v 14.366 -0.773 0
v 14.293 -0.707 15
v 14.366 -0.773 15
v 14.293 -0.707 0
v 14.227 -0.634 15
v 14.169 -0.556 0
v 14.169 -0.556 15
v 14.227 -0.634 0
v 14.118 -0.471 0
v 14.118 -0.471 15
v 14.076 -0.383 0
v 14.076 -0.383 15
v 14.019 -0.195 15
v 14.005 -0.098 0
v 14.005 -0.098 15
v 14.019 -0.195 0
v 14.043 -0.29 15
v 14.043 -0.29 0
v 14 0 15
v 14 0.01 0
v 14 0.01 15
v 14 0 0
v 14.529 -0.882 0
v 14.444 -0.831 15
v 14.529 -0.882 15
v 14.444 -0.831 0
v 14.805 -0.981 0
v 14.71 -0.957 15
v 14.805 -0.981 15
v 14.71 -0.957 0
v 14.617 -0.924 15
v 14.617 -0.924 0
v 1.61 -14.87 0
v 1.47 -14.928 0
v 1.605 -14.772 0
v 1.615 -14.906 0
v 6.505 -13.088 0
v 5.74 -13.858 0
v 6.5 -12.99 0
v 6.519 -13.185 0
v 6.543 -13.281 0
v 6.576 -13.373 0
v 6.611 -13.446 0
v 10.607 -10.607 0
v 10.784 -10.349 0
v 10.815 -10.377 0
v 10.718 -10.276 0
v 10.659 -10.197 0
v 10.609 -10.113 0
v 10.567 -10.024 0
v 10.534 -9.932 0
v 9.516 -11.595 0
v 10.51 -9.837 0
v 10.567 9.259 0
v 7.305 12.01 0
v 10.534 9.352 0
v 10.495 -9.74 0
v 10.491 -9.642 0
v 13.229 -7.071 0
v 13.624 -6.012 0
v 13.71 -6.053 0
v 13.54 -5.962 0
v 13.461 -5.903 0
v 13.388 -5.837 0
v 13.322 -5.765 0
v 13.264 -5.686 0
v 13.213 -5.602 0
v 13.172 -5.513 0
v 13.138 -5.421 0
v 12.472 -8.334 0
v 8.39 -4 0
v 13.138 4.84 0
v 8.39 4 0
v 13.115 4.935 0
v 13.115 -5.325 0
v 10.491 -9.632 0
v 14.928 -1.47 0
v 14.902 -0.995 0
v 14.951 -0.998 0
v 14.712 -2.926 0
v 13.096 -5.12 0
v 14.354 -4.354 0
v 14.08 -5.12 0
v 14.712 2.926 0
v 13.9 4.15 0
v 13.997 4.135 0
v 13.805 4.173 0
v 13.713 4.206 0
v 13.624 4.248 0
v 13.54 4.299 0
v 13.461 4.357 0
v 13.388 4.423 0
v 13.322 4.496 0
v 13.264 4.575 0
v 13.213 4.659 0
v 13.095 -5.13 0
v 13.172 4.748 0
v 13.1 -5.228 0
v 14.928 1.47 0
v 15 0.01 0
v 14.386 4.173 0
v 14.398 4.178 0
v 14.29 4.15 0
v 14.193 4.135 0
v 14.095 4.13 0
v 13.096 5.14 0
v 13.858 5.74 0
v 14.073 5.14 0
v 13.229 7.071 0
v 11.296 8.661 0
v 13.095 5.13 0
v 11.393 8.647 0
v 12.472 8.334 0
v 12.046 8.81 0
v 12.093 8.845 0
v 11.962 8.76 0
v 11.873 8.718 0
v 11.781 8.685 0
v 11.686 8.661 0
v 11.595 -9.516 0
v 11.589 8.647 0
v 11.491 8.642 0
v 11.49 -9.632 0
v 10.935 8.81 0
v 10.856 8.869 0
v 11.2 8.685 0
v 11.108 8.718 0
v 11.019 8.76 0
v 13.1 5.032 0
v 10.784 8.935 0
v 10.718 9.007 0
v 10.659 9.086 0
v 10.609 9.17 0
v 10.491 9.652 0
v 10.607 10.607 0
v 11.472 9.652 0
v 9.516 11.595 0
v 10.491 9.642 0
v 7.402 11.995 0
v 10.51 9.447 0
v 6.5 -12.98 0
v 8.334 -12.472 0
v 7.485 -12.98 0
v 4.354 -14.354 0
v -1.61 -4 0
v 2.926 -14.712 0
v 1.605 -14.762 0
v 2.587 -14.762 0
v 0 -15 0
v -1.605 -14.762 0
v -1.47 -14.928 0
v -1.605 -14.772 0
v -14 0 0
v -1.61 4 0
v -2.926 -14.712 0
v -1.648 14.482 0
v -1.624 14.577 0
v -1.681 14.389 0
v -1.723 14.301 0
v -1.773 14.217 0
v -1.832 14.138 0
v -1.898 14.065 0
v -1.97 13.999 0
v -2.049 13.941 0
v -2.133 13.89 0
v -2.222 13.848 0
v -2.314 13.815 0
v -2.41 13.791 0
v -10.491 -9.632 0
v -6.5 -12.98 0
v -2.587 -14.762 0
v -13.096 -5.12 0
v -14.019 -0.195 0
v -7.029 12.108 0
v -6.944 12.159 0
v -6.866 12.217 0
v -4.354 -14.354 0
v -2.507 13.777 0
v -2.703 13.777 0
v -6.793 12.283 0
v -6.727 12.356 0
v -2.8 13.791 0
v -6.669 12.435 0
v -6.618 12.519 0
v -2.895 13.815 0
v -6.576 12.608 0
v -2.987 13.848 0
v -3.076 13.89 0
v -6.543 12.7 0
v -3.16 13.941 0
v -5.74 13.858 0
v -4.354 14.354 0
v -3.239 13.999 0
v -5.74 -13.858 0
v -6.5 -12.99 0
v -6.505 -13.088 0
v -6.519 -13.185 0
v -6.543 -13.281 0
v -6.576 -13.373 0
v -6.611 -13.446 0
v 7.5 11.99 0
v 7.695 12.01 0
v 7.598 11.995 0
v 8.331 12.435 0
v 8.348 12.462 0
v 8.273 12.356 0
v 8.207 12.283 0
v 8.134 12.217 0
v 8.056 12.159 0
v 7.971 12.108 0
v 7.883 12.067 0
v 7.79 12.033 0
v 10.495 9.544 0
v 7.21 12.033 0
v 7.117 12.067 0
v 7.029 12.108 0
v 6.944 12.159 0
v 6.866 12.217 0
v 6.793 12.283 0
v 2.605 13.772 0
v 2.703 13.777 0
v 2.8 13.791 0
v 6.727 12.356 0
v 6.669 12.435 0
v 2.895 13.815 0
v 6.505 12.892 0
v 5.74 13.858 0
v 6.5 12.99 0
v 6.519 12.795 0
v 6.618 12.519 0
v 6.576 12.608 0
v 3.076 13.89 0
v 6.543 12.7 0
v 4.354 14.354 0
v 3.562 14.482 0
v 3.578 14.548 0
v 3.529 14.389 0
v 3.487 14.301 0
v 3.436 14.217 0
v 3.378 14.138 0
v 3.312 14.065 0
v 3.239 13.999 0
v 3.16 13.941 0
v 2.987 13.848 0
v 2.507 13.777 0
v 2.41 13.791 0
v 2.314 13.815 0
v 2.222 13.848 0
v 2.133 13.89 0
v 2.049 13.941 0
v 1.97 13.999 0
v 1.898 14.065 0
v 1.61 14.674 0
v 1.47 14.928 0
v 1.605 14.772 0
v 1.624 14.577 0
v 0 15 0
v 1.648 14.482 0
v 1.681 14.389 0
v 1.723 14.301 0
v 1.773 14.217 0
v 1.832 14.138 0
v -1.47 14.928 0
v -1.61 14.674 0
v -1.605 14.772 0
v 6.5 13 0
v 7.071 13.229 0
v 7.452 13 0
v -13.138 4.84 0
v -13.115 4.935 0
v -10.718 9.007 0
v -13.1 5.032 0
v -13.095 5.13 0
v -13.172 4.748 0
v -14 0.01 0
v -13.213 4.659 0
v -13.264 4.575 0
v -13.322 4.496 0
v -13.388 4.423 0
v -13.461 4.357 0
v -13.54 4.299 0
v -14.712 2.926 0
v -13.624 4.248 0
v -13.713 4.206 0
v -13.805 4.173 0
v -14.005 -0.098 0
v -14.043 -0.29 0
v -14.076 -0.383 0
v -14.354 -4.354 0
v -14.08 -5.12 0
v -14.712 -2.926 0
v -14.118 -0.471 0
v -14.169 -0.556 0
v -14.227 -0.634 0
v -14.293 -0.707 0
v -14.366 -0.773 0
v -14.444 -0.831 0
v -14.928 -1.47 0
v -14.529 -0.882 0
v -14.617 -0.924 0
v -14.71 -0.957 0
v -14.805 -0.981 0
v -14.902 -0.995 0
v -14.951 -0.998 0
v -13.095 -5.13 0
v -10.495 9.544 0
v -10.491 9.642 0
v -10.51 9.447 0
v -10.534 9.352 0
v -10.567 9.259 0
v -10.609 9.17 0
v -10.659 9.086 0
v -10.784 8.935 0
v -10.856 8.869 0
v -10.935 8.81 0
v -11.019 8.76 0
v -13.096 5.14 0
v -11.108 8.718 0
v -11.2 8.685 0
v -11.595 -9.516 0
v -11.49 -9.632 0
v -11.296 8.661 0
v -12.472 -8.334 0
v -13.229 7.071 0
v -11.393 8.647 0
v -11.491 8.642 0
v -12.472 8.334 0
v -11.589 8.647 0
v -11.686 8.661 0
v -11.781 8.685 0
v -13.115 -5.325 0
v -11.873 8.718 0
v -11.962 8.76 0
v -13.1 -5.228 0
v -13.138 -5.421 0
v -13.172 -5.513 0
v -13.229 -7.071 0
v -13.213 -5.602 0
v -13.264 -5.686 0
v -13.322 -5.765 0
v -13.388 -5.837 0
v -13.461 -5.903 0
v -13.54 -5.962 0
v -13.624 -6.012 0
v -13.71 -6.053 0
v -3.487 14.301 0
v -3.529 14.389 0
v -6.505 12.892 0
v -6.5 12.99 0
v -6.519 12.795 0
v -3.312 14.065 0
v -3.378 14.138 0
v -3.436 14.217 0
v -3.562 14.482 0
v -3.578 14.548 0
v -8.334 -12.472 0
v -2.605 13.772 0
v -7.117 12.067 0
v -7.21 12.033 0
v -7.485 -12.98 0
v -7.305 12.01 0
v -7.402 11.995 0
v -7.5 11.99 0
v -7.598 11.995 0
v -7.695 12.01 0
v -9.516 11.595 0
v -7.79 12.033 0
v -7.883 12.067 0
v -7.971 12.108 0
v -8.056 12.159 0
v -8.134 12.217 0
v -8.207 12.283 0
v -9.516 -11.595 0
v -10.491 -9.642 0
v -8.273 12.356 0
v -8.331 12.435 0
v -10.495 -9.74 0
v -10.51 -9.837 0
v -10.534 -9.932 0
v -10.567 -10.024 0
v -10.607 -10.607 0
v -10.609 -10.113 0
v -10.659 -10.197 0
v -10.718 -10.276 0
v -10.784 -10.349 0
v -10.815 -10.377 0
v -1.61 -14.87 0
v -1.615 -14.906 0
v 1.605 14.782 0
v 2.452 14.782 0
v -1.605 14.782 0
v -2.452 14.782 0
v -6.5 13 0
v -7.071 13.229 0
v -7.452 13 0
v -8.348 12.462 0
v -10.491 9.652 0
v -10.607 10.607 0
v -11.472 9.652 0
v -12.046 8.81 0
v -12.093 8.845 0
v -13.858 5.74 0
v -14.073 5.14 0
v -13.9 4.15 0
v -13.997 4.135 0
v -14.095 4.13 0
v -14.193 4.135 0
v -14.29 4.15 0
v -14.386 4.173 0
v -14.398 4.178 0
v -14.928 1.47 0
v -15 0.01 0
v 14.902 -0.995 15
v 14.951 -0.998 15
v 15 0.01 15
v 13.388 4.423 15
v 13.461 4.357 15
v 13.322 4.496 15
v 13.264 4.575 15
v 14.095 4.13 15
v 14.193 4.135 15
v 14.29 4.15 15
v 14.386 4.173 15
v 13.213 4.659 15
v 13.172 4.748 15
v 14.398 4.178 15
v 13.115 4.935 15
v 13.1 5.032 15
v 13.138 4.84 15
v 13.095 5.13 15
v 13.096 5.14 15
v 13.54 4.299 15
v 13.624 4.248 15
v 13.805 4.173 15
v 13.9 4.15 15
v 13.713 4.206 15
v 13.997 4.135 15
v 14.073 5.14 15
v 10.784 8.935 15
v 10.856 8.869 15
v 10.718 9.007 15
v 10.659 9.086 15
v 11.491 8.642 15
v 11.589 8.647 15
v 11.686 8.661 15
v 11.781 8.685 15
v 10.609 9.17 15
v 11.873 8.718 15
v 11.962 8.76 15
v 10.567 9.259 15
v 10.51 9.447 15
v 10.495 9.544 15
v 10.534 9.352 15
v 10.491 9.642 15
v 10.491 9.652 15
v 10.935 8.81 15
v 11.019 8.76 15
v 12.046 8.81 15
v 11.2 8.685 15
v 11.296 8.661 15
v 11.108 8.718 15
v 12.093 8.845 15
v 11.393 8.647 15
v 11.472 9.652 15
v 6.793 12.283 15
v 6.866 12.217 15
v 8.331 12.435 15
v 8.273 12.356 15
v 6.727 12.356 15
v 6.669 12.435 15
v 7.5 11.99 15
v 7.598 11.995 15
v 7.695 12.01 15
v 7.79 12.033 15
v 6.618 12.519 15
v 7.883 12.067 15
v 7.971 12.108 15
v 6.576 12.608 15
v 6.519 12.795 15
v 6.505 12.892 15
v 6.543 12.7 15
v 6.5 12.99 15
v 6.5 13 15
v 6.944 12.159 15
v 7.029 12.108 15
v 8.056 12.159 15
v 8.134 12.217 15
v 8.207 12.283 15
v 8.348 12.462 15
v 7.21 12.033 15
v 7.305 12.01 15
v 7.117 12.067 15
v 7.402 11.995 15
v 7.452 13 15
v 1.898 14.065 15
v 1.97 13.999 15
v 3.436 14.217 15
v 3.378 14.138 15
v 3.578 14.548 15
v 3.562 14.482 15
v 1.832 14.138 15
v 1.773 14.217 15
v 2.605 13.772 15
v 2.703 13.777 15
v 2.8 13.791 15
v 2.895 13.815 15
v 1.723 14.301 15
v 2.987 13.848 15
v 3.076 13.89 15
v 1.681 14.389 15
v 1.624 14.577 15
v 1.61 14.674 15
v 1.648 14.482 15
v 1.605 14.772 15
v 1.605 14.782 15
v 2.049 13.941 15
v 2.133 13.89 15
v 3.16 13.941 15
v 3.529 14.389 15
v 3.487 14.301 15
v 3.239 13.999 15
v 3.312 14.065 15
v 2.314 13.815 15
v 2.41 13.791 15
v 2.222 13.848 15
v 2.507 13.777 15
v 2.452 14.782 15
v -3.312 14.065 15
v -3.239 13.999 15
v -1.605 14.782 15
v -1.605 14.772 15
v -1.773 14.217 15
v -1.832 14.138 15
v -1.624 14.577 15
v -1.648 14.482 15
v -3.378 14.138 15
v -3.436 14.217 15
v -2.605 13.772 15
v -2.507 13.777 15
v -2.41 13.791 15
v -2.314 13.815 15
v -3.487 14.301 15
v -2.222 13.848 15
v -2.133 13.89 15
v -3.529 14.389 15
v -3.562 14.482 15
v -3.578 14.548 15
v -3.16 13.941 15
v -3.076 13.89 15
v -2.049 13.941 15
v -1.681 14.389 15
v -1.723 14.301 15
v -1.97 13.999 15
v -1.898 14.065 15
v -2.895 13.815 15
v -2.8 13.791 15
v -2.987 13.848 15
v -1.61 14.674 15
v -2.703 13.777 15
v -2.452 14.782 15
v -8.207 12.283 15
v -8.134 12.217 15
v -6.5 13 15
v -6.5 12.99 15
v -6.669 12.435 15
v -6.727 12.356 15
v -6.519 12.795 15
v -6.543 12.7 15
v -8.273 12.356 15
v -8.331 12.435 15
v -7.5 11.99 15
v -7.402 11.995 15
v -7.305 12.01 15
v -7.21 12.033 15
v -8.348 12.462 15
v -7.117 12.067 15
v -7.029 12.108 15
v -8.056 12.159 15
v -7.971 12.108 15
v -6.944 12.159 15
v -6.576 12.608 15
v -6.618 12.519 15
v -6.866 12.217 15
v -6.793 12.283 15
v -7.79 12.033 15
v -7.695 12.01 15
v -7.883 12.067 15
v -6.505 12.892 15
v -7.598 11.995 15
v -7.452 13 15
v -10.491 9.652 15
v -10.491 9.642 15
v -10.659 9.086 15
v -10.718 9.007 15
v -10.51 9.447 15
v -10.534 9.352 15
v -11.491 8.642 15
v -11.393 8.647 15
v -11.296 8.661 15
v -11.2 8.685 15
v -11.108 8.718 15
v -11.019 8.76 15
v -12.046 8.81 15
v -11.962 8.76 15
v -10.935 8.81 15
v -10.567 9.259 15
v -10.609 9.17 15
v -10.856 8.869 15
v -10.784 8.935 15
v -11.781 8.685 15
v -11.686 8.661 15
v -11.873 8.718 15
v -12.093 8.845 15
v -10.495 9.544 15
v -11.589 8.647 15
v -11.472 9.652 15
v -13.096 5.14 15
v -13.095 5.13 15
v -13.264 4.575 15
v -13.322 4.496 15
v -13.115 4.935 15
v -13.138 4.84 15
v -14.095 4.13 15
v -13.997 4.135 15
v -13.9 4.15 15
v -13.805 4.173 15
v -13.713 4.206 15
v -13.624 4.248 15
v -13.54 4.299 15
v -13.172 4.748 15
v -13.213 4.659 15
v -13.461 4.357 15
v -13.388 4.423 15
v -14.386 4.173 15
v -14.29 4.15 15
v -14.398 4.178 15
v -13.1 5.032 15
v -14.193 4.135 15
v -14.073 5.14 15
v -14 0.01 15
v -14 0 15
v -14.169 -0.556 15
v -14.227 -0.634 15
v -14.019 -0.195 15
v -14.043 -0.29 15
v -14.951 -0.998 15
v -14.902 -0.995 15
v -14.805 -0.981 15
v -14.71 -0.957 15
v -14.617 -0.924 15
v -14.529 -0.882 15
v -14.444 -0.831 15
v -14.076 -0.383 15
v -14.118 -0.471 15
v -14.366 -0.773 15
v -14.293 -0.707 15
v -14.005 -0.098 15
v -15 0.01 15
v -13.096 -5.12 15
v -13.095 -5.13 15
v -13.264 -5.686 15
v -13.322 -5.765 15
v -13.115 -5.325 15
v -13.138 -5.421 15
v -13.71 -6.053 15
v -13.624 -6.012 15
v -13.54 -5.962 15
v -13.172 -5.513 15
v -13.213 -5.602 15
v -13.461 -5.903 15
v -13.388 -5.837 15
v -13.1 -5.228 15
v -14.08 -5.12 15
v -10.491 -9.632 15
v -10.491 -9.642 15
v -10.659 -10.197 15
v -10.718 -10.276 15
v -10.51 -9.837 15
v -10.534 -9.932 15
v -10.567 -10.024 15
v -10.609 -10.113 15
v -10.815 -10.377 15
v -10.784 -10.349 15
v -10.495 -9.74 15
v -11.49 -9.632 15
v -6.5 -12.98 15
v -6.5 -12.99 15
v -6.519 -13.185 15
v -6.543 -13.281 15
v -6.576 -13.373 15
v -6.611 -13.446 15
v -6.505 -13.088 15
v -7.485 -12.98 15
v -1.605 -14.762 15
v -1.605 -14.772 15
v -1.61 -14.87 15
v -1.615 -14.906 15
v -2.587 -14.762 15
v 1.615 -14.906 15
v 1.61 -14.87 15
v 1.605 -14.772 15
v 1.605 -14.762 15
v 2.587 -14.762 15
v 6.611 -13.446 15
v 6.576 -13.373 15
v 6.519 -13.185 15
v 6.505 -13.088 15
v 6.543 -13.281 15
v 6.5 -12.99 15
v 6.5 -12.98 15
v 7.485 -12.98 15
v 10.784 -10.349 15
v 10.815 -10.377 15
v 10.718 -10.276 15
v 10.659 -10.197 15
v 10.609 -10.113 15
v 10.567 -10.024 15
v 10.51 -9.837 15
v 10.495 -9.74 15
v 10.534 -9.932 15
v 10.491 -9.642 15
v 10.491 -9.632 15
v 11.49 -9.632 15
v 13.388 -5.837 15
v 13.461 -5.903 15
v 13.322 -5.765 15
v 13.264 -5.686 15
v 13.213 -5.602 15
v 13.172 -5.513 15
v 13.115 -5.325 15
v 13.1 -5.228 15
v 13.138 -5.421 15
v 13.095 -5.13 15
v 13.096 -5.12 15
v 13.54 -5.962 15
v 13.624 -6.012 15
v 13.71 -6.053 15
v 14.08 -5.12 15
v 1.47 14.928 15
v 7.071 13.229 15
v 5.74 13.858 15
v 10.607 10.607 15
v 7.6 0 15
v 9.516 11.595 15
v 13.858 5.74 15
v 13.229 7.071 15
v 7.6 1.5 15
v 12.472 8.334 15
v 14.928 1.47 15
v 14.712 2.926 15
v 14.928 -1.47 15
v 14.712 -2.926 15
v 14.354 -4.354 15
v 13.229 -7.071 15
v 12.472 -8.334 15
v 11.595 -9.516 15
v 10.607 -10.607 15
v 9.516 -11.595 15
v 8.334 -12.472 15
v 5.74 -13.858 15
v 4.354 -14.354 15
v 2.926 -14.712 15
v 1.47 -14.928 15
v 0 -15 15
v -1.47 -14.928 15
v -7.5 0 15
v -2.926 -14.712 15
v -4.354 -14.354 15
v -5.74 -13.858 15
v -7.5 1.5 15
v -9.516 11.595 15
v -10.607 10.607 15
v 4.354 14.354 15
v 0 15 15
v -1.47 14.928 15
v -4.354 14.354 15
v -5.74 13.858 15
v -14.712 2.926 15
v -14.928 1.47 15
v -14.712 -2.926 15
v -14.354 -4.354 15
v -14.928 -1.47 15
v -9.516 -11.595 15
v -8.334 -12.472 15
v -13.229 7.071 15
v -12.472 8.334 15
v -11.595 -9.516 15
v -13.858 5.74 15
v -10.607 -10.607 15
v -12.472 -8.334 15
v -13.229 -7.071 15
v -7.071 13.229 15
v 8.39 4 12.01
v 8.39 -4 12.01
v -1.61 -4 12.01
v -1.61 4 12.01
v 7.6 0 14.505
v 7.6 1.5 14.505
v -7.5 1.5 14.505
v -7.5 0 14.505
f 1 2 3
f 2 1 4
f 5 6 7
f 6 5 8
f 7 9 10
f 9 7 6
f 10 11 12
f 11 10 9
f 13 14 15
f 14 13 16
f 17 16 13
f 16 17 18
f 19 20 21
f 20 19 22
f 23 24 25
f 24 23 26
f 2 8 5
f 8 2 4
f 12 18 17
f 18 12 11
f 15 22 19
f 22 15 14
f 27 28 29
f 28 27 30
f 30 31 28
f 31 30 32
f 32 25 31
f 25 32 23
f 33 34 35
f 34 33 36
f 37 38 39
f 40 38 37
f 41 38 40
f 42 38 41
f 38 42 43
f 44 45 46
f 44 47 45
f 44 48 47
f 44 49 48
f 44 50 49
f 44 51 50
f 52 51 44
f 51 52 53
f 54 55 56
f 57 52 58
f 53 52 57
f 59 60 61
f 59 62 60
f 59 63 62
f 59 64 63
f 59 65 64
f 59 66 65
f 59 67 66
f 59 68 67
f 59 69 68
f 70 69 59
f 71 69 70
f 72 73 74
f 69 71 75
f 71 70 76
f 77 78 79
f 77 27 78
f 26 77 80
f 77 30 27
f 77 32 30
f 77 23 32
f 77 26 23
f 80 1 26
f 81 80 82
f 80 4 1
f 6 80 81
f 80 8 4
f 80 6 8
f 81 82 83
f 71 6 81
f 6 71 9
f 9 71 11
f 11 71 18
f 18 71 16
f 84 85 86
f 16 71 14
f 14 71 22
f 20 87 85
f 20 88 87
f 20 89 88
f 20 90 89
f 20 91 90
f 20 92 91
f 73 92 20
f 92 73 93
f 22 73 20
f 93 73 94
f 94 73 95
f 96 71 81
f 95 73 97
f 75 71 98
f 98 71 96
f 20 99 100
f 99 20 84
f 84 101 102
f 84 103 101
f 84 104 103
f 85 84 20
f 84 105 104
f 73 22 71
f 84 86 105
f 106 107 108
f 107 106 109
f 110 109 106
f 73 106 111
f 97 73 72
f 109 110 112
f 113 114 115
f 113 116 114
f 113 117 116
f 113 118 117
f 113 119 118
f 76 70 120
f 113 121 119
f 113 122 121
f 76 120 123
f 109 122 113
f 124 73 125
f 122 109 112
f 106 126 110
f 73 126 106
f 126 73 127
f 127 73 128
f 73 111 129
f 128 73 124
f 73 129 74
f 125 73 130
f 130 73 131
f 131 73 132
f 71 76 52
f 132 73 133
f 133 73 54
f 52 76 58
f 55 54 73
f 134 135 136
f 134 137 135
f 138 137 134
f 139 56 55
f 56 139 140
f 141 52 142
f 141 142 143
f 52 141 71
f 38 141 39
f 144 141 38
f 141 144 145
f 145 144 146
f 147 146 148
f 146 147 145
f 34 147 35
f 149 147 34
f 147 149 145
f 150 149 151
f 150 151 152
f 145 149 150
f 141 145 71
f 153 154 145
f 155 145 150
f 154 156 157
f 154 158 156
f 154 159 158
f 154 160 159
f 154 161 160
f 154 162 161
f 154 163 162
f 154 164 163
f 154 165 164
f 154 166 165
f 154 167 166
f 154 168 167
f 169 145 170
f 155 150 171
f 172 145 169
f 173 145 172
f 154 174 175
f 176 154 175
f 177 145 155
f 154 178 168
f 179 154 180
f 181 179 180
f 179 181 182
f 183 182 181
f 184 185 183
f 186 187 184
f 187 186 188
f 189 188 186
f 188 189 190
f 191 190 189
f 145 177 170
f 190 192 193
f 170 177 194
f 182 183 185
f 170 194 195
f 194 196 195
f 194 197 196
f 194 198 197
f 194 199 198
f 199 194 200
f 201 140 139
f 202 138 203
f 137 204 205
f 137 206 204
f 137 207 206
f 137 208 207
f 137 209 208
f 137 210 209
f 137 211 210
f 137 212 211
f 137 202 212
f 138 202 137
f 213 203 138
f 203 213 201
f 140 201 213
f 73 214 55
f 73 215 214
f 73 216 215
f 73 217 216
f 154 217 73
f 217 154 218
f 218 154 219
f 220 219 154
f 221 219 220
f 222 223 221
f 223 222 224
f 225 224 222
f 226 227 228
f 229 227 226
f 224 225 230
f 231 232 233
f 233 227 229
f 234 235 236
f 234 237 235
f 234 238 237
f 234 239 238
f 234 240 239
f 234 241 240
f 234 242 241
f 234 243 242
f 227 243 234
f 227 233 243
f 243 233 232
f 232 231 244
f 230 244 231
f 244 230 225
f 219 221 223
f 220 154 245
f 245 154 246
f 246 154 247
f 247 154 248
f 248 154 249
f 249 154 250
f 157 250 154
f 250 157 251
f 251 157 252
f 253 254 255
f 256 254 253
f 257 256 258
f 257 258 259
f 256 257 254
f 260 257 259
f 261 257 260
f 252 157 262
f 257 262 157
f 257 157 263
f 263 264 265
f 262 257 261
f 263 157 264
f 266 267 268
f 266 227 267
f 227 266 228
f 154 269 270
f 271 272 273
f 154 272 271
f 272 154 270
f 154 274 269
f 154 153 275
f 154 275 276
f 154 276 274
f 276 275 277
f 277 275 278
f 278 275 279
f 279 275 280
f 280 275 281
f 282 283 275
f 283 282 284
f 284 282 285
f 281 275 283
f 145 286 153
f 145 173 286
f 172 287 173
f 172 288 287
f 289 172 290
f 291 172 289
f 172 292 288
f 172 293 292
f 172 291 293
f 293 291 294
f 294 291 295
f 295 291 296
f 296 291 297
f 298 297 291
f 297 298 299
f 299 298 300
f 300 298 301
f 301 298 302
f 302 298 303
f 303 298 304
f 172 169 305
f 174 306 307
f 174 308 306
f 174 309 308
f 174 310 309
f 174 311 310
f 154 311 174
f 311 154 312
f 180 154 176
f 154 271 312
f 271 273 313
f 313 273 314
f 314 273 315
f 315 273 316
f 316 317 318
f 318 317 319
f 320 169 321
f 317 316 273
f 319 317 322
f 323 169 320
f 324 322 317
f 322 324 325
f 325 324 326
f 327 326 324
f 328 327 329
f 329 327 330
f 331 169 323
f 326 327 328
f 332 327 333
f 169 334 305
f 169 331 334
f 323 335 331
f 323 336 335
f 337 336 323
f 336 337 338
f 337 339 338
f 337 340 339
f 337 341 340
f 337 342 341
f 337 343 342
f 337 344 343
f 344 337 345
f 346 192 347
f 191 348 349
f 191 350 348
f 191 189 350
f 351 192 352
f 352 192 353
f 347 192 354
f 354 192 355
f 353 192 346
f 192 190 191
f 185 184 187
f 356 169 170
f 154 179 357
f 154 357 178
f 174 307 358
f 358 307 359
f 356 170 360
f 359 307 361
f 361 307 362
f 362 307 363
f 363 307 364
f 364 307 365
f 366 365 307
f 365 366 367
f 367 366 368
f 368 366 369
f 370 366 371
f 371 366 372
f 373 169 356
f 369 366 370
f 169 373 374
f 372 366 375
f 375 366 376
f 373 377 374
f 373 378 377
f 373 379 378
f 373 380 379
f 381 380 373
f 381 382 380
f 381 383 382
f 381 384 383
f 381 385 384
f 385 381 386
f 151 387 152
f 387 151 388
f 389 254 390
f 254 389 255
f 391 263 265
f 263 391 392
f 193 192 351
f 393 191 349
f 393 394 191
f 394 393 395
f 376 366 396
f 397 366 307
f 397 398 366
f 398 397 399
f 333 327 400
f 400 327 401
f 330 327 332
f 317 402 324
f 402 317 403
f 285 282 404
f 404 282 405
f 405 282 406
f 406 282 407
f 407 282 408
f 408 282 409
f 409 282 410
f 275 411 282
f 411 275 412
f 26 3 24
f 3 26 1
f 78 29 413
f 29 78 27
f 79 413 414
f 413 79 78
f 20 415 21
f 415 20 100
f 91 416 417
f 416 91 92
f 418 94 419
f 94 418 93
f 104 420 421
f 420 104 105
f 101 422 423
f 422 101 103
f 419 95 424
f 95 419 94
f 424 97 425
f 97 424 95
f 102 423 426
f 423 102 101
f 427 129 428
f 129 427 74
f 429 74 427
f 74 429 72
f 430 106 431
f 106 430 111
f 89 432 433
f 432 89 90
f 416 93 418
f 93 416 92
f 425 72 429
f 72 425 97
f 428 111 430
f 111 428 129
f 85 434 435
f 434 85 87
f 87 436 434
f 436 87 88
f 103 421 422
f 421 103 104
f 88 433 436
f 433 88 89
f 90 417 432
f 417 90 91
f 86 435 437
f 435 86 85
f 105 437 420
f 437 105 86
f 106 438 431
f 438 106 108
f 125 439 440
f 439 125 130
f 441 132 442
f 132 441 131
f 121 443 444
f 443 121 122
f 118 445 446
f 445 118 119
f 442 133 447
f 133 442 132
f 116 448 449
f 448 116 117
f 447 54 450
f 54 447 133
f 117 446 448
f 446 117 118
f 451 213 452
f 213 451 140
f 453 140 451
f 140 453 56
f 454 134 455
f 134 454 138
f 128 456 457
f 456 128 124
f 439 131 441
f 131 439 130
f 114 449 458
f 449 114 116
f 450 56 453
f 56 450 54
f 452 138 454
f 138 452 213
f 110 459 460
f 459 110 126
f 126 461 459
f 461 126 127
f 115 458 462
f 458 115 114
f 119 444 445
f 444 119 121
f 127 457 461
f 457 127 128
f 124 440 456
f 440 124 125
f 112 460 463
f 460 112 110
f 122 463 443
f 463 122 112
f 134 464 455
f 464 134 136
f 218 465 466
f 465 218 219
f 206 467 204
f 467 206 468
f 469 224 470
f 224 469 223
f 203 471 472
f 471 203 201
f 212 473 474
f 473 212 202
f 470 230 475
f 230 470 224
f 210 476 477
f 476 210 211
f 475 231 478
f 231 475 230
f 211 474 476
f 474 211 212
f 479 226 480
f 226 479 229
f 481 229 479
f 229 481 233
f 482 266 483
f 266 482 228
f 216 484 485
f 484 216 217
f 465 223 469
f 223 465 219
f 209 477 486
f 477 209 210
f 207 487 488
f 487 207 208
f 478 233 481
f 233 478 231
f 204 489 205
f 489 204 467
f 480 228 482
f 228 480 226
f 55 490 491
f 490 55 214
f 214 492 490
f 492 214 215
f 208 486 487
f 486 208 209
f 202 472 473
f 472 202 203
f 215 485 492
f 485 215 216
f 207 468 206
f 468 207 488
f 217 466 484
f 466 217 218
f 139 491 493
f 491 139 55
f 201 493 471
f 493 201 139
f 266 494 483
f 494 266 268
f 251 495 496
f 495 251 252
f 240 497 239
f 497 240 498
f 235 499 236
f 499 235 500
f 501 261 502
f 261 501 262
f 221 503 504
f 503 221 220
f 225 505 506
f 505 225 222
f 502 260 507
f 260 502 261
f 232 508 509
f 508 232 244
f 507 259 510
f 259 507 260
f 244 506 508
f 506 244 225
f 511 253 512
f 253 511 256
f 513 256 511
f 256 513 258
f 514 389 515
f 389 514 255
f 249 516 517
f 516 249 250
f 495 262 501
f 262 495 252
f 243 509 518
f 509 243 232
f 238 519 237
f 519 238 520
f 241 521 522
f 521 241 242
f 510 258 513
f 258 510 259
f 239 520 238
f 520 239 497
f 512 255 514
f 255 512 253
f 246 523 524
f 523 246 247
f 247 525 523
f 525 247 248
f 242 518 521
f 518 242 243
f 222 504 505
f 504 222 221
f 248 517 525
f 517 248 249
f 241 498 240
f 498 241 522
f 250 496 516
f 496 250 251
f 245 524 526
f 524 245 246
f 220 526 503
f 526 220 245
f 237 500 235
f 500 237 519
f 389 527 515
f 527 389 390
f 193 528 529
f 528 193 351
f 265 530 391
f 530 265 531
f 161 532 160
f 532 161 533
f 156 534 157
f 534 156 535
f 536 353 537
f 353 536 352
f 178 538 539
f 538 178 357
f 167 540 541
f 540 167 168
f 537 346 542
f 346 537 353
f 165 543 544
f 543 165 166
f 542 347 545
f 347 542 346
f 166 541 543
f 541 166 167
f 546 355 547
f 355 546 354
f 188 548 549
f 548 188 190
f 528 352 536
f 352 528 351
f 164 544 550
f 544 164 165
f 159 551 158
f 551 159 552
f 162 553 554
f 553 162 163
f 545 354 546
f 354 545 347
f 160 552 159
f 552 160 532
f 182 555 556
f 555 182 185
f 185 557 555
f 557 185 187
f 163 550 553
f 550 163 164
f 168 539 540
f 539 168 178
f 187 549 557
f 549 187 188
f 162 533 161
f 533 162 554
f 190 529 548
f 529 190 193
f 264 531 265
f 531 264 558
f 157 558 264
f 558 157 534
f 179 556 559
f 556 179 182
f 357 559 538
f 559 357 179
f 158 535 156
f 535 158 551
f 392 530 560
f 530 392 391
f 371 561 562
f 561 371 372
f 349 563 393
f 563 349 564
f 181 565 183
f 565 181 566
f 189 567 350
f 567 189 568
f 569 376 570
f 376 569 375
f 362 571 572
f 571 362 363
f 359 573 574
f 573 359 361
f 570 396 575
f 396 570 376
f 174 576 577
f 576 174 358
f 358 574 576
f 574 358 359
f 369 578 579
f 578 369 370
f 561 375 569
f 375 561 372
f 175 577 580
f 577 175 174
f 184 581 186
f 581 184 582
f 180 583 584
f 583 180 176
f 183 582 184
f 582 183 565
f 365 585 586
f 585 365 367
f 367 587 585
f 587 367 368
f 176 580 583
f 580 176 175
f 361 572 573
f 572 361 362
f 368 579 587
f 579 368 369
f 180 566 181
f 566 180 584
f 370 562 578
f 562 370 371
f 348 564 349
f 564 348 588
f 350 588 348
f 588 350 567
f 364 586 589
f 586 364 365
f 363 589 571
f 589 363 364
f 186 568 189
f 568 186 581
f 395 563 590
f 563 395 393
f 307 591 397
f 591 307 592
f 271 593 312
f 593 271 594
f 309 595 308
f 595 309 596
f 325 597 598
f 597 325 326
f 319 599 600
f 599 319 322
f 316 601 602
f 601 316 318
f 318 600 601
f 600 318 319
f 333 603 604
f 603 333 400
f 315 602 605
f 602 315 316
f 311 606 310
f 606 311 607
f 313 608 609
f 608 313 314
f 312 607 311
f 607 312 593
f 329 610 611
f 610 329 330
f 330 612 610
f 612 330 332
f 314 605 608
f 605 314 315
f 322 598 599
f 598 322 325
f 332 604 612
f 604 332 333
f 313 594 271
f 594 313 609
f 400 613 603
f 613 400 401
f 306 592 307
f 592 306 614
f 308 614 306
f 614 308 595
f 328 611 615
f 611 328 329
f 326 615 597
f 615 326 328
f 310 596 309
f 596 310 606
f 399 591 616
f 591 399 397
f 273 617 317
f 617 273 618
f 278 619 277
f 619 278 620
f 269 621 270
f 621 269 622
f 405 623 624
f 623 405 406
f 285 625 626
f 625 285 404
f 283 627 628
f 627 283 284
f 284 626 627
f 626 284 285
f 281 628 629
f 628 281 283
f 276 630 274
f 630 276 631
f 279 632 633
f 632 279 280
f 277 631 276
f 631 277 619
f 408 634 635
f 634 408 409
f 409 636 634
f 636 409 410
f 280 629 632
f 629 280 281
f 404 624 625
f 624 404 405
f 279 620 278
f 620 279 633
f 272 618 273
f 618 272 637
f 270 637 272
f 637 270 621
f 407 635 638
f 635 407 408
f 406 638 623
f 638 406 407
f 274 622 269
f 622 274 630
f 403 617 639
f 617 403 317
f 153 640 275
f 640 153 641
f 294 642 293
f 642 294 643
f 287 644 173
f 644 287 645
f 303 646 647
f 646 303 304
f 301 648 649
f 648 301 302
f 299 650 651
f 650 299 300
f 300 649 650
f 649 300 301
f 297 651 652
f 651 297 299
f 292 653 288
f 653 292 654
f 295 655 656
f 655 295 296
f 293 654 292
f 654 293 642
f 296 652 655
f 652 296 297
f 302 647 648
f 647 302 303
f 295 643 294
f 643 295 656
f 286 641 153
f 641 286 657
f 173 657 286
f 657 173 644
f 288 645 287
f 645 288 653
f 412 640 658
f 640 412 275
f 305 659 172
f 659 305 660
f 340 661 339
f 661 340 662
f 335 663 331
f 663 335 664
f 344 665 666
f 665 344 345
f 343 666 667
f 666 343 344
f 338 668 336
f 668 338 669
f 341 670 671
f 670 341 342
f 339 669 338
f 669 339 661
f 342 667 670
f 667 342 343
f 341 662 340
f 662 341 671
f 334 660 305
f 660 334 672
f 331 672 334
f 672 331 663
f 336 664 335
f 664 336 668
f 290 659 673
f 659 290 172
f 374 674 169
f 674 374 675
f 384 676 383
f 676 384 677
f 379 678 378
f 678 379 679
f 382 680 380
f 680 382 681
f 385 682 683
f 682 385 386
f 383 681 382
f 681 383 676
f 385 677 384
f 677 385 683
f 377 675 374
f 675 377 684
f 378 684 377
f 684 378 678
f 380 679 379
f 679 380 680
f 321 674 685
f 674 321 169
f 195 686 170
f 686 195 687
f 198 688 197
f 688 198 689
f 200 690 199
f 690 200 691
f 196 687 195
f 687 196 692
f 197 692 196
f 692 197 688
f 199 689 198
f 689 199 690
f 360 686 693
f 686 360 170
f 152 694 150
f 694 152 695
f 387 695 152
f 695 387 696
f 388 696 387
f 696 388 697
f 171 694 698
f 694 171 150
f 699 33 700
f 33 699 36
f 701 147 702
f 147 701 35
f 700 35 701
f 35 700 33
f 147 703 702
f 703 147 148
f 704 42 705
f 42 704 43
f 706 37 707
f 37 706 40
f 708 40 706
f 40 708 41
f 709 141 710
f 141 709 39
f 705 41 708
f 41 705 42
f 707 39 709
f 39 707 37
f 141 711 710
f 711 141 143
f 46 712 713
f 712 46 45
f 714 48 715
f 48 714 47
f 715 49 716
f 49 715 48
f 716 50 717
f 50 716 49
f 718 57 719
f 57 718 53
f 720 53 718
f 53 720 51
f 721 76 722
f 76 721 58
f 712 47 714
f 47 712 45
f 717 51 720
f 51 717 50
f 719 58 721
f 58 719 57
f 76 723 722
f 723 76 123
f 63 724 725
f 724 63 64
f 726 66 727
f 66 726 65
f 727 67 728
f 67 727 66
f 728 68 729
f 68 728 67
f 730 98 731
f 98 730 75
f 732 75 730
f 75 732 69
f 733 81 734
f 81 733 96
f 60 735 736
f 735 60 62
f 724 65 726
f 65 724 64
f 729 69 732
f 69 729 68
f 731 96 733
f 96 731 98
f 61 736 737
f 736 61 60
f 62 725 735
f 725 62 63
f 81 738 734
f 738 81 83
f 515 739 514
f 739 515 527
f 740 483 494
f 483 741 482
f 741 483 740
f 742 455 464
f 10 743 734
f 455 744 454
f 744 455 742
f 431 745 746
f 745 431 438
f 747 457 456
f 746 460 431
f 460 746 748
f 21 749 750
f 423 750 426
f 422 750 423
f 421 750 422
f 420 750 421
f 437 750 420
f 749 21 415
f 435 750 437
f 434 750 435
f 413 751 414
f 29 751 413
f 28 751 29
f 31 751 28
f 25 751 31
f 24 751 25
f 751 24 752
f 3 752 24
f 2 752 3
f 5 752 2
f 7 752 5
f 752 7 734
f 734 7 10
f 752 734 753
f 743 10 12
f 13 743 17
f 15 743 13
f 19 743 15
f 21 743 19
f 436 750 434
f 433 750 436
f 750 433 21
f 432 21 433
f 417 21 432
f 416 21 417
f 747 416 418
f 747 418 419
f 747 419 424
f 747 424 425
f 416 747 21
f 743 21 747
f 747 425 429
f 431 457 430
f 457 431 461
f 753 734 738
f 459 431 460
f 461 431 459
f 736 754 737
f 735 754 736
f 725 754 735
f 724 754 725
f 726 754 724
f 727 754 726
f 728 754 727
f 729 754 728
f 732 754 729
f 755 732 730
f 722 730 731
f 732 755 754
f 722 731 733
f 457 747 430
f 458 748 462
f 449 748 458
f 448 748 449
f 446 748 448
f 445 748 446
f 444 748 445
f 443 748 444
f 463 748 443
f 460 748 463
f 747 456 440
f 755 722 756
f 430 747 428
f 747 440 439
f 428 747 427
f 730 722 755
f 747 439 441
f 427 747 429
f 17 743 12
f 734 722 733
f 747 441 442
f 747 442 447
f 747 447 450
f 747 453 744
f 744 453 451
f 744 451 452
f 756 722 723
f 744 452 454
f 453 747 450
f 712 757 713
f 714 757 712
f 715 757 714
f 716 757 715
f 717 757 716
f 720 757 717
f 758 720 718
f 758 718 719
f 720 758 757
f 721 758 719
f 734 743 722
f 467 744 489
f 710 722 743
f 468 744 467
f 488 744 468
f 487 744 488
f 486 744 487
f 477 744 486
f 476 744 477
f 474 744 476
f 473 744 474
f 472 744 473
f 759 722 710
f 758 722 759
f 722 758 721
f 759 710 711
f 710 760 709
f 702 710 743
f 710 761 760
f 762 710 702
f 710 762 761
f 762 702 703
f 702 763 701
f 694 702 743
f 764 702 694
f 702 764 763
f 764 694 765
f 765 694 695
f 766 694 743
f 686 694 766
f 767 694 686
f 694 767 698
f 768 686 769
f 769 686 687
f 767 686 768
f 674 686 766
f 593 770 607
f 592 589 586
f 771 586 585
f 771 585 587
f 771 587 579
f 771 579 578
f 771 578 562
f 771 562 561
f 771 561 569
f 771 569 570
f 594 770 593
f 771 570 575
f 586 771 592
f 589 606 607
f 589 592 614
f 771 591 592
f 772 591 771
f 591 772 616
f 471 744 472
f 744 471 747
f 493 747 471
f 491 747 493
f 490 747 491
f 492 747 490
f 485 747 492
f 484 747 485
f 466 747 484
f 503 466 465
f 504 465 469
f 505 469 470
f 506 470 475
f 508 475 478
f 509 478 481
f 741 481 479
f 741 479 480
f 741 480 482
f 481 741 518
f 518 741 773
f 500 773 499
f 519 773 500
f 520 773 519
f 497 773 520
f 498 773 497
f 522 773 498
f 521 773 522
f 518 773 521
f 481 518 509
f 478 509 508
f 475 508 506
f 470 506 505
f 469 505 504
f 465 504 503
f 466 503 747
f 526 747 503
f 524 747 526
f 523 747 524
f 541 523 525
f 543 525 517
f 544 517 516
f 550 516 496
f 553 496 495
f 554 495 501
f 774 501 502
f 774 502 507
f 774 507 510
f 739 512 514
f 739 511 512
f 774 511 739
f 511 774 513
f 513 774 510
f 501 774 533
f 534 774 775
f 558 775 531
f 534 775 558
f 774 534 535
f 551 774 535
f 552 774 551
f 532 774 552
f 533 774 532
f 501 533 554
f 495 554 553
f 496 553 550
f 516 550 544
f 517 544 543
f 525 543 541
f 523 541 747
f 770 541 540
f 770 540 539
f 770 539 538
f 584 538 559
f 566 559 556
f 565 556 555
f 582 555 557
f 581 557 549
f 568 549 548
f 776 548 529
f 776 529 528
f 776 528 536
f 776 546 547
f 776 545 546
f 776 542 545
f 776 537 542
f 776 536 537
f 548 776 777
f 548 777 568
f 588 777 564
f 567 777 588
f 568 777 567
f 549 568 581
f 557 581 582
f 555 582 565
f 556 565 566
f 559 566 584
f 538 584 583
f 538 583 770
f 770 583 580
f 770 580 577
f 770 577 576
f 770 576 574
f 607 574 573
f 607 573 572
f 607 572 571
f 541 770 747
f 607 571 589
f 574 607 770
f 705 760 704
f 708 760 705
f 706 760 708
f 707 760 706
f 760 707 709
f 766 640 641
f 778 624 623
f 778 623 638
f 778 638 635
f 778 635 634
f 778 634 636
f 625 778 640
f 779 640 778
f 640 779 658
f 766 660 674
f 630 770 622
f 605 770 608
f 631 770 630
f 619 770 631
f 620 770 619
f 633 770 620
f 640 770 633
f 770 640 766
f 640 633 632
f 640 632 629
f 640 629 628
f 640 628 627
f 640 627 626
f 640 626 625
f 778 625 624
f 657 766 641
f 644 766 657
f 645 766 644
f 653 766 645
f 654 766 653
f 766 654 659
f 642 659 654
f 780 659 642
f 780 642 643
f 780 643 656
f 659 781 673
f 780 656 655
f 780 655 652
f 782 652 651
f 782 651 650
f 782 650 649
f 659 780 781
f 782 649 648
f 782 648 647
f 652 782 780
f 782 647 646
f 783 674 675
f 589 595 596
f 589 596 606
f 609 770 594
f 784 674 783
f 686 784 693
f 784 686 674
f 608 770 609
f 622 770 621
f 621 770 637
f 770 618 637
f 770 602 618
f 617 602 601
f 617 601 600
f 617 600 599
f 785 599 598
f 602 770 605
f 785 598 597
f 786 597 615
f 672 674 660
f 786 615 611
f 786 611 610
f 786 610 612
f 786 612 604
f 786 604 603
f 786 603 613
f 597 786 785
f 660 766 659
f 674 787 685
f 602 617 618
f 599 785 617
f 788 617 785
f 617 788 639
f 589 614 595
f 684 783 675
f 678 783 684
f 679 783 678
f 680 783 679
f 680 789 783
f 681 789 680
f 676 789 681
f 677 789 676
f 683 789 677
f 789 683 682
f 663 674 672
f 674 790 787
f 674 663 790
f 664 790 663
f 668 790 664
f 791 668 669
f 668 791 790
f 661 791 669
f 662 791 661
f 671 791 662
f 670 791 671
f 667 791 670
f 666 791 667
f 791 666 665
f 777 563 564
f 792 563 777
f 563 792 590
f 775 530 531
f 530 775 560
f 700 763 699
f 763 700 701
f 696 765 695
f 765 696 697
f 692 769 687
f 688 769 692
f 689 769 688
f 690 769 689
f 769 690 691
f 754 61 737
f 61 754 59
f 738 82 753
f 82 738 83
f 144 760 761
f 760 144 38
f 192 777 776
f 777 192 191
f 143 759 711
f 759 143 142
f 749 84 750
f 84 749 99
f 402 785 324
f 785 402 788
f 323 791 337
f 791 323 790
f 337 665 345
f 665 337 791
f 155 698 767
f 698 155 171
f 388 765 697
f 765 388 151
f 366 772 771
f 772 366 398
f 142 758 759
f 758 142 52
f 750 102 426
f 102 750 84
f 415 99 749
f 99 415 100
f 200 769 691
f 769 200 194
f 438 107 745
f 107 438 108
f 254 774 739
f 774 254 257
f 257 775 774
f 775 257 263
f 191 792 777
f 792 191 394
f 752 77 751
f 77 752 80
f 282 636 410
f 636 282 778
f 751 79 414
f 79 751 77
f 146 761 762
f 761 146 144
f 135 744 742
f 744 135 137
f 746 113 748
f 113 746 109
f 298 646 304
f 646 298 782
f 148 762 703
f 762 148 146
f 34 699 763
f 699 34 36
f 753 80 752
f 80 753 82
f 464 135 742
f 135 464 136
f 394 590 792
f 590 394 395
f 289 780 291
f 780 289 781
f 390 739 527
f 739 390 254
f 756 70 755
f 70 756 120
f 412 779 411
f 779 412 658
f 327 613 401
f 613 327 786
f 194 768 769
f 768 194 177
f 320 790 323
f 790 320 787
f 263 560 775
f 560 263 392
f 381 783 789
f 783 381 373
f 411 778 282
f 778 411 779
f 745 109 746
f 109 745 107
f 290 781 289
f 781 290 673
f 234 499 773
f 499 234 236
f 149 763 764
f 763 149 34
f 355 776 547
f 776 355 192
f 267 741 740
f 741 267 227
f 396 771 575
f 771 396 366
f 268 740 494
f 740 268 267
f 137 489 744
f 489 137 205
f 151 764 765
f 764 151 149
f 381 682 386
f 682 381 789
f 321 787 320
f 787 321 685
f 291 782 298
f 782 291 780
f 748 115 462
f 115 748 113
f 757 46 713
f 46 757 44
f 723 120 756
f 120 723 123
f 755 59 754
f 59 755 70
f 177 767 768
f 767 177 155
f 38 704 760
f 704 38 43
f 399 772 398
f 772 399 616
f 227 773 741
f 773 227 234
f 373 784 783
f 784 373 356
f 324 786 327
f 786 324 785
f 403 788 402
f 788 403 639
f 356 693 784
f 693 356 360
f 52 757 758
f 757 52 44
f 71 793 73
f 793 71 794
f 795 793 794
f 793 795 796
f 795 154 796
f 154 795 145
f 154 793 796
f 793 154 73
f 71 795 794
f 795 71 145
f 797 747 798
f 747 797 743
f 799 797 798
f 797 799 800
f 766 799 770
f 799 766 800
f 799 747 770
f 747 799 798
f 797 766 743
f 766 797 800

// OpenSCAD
$fn = 64;

// --- Dimensions ---
R_KNOB      = 15;       // Knob radius (30 mm diameter)
H_KNOB      = 15;       // Knob height
R_BORE      = 3.1;      // Bore radius (6.2 mm diameter)
H_BORE      = 12;       // Bore depth
X_FLAT      = -1.6;     // X position of D-shaft flat (3.1 - 4.7)
NUM_GROOVES = 18;       // Number of grip grooves
R_GROOVE    = 1;        // Groove radius (2 mm diameter)
W_POINTER   = 1.5;      // Pointer groove width
D_POINTER    = 1;        // Pointer groove depth

// --- Main Model ---
difference() {
    // Solid cylinder body
    cylinder(r=R_KNOB, h=H_KNOB, center=false);
    
    // D-shaped blind bore
    // Cuts the left side of the bore circle to create the flat face
    translate([X_FLAT - 0.01, -4, 0]) 
        cube([10, 8, H_BORE + 0.01]);
        
    // 18 evenly spaced grip grooves
    for (i = [0 : NUM_GROOVES - 1]) {
        theta = i * (360 / NUM_GROOVES);
        translate([R_KNOB * cos(theta), R_KNOB * sin(theta), 0]) {
            rotate([0, 0, 90]) {
                // Half-cylinder groove: flat face on +X, cuts inward
                difference() {
                    cylinder(r=R_GROOVE, h=H_KNOB + 0.01, center=false);
                    translate([0.01, -1, 0]) cube([10, 2, H_KNOB + 0.01]);
                }
            }
        }
    }
    
    // Pointer groove on top face
    // Spans from centre (x=0) to outer edge (x=-15), centered at x=-7.5
    translate([-7.5, 0, H_KNOB - D_POINTER + 0.505]) 
        cube([15.1, W_POINTER, D_POINTER + 0.01]);
}
